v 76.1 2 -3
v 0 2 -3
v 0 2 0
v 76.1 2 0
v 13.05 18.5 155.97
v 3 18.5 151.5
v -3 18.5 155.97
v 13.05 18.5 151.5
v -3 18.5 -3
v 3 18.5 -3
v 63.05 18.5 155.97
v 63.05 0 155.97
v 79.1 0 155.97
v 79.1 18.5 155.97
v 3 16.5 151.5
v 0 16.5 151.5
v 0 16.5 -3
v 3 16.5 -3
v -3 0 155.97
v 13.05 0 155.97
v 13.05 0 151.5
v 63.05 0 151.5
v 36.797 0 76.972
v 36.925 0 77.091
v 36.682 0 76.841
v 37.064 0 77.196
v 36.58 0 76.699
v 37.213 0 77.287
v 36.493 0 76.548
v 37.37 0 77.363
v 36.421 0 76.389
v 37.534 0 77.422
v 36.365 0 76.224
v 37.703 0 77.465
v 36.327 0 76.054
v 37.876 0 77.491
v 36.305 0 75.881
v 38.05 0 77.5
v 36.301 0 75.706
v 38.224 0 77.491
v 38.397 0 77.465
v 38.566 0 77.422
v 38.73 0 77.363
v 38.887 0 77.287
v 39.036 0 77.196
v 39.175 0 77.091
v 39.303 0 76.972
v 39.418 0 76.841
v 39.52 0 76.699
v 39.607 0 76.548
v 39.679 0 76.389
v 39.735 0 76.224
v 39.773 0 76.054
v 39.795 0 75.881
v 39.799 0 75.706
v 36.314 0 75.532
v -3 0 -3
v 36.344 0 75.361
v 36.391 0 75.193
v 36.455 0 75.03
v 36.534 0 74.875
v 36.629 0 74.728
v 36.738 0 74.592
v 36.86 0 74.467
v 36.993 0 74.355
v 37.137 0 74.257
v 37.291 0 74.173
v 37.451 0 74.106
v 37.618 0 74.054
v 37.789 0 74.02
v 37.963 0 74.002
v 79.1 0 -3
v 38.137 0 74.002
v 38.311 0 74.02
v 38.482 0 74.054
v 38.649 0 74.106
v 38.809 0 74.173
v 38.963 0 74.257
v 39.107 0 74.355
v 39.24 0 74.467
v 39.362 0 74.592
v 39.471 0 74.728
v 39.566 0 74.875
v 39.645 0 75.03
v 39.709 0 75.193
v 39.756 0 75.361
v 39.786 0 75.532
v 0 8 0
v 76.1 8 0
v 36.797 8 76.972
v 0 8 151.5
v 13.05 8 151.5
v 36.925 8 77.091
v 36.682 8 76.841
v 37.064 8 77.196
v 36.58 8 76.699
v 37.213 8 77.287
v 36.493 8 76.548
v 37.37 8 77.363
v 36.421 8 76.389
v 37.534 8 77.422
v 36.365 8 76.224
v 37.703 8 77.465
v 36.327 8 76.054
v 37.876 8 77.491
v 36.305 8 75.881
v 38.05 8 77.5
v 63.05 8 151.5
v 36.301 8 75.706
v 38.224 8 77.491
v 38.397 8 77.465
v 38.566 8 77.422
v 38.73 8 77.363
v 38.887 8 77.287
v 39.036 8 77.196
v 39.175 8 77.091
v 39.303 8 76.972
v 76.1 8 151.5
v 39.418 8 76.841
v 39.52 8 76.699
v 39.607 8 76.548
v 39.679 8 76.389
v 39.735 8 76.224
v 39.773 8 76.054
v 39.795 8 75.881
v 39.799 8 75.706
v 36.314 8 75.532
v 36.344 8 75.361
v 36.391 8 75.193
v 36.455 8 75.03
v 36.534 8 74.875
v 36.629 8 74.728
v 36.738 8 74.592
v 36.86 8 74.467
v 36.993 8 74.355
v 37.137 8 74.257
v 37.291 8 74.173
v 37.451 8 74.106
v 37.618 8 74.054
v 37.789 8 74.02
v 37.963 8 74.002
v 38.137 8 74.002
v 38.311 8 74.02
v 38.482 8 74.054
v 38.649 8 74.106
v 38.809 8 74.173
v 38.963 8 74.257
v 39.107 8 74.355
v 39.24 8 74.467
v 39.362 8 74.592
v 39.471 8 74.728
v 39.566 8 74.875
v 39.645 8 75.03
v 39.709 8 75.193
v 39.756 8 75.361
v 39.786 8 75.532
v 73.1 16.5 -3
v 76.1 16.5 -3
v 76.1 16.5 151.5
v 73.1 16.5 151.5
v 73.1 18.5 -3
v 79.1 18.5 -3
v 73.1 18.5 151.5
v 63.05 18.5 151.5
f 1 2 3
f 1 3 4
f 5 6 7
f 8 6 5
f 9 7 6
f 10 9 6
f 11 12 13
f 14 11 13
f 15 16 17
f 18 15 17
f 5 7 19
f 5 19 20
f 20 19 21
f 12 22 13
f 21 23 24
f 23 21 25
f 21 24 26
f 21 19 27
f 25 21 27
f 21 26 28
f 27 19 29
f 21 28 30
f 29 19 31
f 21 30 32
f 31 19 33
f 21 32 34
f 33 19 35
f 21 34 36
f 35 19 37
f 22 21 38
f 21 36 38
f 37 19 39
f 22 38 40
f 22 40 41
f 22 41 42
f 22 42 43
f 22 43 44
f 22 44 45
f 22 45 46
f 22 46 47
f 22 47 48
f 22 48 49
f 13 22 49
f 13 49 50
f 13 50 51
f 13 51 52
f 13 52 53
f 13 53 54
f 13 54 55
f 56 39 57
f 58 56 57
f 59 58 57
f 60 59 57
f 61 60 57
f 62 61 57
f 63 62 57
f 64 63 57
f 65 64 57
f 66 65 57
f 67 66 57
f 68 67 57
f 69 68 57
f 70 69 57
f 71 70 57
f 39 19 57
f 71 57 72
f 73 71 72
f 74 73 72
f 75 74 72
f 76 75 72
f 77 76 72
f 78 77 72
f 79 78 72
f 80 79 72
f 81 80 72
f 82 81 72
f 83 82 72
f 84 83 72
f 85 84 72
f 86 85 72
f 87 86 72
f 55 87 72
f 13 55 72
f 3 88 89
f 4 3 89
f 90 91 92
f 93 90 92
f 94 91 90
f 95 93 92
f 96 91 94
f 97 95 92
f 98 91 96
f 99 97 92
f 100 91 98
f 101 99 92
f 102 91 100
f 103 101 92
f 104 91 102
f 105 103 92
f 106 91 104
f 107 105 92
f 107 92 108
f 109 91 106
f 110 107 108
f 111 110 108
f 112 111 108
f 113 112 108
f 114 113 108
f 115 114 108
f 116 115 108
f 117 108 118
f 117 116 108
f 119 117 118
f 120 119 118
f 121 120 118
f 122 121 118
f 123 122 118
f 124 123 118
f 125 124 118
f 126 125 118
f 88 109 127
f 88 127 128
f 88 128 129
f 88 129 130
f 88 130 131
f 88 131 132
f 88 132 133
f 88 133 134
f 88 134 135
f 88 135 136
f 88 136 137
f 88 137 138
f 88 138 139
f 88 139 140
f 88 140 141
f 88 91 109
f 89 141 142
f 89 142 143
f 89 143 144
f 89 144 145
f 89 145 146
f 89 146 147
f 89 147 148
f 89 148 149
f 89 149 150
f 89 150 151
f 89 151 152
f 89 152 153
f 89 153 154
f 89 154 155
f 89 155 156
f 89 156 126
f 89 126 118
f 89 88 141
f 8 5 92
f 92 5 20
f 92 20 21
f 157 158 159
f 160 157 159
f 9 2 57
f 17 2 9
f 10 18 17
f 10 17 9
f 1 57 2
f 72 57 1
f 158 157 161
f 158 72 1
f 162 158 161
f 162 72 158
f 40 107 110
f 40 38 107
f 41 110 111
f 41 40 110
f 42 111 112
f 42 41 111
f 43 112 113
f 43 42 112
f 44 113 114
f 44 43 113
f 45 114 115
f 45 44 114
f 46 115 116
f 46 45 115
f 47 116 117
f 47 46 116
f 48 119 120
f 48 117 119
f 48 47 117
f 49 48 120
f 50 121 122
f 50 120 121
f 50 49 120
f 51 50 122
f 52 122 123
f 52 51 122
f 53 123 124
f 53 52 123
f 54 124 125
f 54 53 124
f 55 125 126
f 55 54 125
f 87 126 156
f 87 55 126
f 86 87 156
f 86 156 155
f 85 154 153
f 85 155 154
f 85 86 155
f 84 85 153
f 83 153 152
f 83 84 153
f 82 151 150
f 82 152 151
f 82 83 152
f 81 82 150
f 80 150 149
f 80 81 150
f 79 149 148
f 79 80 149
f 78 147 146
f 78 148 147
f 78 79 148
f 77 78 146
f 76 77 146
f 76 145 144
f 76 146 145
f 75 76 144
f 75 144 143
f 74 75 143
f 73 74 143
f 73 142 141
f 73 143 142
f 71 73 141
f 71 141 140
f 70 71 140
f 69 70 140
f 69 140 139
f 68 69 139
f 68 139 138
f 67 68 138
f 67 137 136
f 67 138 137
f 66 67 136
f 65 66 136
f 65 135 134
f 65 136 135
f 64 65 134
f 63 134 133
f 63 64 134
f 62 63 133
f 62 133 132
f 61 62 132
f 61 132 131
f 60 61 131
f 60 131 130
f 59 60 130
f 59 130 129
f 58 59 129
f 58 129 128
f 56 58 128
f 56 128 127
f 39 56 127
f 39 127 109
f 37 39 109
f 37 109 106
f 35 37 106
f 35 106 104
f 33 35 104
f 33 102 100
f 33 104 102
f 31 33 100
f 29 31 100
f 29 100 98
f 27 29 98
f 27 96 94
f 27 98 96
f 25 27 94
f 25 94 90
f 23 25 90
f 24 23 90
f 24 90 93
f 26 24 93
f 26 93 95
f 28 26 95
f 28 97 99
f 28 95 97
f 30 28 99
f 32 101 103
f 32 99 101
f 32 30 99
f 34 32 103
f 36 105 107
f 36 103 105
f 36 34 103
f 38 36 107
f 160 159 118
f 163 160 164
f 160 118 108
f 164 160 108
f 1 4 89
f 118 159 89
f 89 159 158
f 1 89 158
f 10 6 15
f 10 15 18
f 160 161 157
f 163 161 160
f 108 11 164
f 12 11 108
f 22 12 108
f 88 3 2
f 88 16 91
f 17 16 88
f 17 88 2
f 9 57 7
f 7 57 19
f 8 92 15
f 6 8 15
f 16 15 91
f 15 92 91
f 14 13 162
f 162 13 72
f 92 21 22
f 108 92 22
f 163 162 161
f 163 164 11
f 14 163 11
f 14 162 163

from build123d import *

# Parameters (mm, degrees)
SKETCH1_W                   = 76.1
SKETCH1_H                   = 151.5
BOSS_EXTRUDE2_DEPTH         = 8
SKETCH1_4_W                 = 76.1
SKETCH1_4_H                 = 3
BOSS_EXTRUDE3_DEPTH         = 18.5
CUT_EXTRUDE_THIN1_START     = -8
CUT_EXTRUDE_THIN1_OUTLINE_W = 50
CUT_EXTRUDE_THIN1_OUTLINE_H = 4.46993239
CUT_EXTRUDE_THIN1_DEPTH     = 18.5
SKETCH4_W                   = 76.1
SKETCH4_H                   = 3
CUT_EXTRUDE1_DEPTH          = 16.5
SKETCH6_W                   = 154.5
SKETCH6_H                   = 2
BOSS_EXTRUDE4_DEPTH         = 3
SKETCH7_W                   = 154.5
SKETCH7_H                   = 2
BOSS_EXTRUDE5_DEPTH         = 3
CUT_EXTRUDE2_DEPTH          = 3
CUT_EXTRUDE2_DEPTH_BACK     = 76.1
SKETCH8_R                   = 1.75


# Read off the part's stored shape, not the designer's step: Cut-Extrude-Thin1
with BuildPart() as part:
    # Sketch1 → Boss-Extrude2 (new body)
    with BuildSketch(Plane(origin=(0, 0, 0), x_dir=(1, 0, 0), z_dir=(0, 1, 0))):
        with Locations((38.05, -75.75)):
            Rectangle(SKETCH1_W, SKETCH1_H)
    extrude(amount=BOSS_EXTRUDE2_DEPTH)

    # Sketch1<4> → Boss-Extrude3 (add)
    with BuildSketch(Plane(origin=(0, 0, 0), x_dir=(1, 0, 0), z_dir=(0, 1, 0))):
        Polygon((0, -151.5), (-3, -151.5), (-3, -155.96993239), (79.1, -155.96993239), (79.1, -151.5), (76.1, -151.5), align=None)
        Polygon((0, 3), (-3, 3), (-3, -151.5), (0, -151.5), (0, 0), align=None)
        Polygon((79.1, 3), (79.1, -151.5), (76.1, -151.5), (76.1, 0), (76.1, 3), align=None)
        with Locations((38.05, 1.5)):
            Rectangle(SKETCH1_4_W, SKETCH1_4_H)
    extrude(amount=BOSS_EXTRUDE3_DEPTH)

    # Cut-Extrude-Thin1 outline → Cut-Extrude-Thin1 (cut)
    with BuildSketch(Plane(origin=(0, 8, 0), x_dir=(1, 0, 0), z_dir=(0, 1, 0)).offset(CUT_EXTRUDE_THIN1_START)):
        with Locations((38.05, -153.734966195)):
            Rectangle(CUT_EXTRUDE_THIN1_OUTLINE_W, CUT_EXTRUDE_THIN1_OUTLINE_H)
    extrude(amount=CUT_EXTRUDE_THIN1_DEPTH, mode=Mode.SUBTRACT)

    # Sketch4 → Cut-Extrude1 (cut)
    with BuildSketch(Plane(origin=(0, 18.5, 0), x_dir=(1, 0, 0), z_dir=(0, 1, 0))):
        with Locations((38.05, 1.5)):
            Rectangle(SKETCH4_W, SKETCH4_H)
    extrude(amount=-CUT_EXTRUDE1_DEPTH, mode=Mode.SUBTRACT)

    # Sketch6 → Boss-Extrude4 (add)
    with BuildSketch(Plane(origin=(0, 0, 0), x_dir=(0, 0, -1), z_dir=(1, 0, 0))):
        with Locations((-74.25, 17.5)):
            Rectangle(SKETCH6_W, SKETCH6_H)
    extrude(amount=BOSS_EXTRUDE4_DEPTH)

    # Sketch7 → Boss-Extrude5 (add)
    with BuildSketch(Plane.ZY.offset(-76.1)):
        with Locations((74.25, 17.5)):
            Rectangle(SKETCH7_W, SKETCH7_H)
    extrude(amount=BOSS_EXTRUDE5_DEPTH)

    # Sketch8 → Cut-Extrude2 (cut, two sides: drawn at the far end of the back side and taken through both)
    with BuildSketch(Plane(origin=(0, 8, 0), x_dir=(1, 0, 0), z_dir=(0, 1, 0)).offset(-CUT_EXTRUDE2_DEPTH_BACK)):
        with Locations(Location((38.05, -75.75, 0), (0, 0, 270))):
            Circle(SKETCH8_R)
    extrude(amount=CUT_EXTRUDE2_DEPTH + CUT_EXTRUDE2_DEPTH_BACK, mode=Mode.SUBTRACT)


solid = part.part
